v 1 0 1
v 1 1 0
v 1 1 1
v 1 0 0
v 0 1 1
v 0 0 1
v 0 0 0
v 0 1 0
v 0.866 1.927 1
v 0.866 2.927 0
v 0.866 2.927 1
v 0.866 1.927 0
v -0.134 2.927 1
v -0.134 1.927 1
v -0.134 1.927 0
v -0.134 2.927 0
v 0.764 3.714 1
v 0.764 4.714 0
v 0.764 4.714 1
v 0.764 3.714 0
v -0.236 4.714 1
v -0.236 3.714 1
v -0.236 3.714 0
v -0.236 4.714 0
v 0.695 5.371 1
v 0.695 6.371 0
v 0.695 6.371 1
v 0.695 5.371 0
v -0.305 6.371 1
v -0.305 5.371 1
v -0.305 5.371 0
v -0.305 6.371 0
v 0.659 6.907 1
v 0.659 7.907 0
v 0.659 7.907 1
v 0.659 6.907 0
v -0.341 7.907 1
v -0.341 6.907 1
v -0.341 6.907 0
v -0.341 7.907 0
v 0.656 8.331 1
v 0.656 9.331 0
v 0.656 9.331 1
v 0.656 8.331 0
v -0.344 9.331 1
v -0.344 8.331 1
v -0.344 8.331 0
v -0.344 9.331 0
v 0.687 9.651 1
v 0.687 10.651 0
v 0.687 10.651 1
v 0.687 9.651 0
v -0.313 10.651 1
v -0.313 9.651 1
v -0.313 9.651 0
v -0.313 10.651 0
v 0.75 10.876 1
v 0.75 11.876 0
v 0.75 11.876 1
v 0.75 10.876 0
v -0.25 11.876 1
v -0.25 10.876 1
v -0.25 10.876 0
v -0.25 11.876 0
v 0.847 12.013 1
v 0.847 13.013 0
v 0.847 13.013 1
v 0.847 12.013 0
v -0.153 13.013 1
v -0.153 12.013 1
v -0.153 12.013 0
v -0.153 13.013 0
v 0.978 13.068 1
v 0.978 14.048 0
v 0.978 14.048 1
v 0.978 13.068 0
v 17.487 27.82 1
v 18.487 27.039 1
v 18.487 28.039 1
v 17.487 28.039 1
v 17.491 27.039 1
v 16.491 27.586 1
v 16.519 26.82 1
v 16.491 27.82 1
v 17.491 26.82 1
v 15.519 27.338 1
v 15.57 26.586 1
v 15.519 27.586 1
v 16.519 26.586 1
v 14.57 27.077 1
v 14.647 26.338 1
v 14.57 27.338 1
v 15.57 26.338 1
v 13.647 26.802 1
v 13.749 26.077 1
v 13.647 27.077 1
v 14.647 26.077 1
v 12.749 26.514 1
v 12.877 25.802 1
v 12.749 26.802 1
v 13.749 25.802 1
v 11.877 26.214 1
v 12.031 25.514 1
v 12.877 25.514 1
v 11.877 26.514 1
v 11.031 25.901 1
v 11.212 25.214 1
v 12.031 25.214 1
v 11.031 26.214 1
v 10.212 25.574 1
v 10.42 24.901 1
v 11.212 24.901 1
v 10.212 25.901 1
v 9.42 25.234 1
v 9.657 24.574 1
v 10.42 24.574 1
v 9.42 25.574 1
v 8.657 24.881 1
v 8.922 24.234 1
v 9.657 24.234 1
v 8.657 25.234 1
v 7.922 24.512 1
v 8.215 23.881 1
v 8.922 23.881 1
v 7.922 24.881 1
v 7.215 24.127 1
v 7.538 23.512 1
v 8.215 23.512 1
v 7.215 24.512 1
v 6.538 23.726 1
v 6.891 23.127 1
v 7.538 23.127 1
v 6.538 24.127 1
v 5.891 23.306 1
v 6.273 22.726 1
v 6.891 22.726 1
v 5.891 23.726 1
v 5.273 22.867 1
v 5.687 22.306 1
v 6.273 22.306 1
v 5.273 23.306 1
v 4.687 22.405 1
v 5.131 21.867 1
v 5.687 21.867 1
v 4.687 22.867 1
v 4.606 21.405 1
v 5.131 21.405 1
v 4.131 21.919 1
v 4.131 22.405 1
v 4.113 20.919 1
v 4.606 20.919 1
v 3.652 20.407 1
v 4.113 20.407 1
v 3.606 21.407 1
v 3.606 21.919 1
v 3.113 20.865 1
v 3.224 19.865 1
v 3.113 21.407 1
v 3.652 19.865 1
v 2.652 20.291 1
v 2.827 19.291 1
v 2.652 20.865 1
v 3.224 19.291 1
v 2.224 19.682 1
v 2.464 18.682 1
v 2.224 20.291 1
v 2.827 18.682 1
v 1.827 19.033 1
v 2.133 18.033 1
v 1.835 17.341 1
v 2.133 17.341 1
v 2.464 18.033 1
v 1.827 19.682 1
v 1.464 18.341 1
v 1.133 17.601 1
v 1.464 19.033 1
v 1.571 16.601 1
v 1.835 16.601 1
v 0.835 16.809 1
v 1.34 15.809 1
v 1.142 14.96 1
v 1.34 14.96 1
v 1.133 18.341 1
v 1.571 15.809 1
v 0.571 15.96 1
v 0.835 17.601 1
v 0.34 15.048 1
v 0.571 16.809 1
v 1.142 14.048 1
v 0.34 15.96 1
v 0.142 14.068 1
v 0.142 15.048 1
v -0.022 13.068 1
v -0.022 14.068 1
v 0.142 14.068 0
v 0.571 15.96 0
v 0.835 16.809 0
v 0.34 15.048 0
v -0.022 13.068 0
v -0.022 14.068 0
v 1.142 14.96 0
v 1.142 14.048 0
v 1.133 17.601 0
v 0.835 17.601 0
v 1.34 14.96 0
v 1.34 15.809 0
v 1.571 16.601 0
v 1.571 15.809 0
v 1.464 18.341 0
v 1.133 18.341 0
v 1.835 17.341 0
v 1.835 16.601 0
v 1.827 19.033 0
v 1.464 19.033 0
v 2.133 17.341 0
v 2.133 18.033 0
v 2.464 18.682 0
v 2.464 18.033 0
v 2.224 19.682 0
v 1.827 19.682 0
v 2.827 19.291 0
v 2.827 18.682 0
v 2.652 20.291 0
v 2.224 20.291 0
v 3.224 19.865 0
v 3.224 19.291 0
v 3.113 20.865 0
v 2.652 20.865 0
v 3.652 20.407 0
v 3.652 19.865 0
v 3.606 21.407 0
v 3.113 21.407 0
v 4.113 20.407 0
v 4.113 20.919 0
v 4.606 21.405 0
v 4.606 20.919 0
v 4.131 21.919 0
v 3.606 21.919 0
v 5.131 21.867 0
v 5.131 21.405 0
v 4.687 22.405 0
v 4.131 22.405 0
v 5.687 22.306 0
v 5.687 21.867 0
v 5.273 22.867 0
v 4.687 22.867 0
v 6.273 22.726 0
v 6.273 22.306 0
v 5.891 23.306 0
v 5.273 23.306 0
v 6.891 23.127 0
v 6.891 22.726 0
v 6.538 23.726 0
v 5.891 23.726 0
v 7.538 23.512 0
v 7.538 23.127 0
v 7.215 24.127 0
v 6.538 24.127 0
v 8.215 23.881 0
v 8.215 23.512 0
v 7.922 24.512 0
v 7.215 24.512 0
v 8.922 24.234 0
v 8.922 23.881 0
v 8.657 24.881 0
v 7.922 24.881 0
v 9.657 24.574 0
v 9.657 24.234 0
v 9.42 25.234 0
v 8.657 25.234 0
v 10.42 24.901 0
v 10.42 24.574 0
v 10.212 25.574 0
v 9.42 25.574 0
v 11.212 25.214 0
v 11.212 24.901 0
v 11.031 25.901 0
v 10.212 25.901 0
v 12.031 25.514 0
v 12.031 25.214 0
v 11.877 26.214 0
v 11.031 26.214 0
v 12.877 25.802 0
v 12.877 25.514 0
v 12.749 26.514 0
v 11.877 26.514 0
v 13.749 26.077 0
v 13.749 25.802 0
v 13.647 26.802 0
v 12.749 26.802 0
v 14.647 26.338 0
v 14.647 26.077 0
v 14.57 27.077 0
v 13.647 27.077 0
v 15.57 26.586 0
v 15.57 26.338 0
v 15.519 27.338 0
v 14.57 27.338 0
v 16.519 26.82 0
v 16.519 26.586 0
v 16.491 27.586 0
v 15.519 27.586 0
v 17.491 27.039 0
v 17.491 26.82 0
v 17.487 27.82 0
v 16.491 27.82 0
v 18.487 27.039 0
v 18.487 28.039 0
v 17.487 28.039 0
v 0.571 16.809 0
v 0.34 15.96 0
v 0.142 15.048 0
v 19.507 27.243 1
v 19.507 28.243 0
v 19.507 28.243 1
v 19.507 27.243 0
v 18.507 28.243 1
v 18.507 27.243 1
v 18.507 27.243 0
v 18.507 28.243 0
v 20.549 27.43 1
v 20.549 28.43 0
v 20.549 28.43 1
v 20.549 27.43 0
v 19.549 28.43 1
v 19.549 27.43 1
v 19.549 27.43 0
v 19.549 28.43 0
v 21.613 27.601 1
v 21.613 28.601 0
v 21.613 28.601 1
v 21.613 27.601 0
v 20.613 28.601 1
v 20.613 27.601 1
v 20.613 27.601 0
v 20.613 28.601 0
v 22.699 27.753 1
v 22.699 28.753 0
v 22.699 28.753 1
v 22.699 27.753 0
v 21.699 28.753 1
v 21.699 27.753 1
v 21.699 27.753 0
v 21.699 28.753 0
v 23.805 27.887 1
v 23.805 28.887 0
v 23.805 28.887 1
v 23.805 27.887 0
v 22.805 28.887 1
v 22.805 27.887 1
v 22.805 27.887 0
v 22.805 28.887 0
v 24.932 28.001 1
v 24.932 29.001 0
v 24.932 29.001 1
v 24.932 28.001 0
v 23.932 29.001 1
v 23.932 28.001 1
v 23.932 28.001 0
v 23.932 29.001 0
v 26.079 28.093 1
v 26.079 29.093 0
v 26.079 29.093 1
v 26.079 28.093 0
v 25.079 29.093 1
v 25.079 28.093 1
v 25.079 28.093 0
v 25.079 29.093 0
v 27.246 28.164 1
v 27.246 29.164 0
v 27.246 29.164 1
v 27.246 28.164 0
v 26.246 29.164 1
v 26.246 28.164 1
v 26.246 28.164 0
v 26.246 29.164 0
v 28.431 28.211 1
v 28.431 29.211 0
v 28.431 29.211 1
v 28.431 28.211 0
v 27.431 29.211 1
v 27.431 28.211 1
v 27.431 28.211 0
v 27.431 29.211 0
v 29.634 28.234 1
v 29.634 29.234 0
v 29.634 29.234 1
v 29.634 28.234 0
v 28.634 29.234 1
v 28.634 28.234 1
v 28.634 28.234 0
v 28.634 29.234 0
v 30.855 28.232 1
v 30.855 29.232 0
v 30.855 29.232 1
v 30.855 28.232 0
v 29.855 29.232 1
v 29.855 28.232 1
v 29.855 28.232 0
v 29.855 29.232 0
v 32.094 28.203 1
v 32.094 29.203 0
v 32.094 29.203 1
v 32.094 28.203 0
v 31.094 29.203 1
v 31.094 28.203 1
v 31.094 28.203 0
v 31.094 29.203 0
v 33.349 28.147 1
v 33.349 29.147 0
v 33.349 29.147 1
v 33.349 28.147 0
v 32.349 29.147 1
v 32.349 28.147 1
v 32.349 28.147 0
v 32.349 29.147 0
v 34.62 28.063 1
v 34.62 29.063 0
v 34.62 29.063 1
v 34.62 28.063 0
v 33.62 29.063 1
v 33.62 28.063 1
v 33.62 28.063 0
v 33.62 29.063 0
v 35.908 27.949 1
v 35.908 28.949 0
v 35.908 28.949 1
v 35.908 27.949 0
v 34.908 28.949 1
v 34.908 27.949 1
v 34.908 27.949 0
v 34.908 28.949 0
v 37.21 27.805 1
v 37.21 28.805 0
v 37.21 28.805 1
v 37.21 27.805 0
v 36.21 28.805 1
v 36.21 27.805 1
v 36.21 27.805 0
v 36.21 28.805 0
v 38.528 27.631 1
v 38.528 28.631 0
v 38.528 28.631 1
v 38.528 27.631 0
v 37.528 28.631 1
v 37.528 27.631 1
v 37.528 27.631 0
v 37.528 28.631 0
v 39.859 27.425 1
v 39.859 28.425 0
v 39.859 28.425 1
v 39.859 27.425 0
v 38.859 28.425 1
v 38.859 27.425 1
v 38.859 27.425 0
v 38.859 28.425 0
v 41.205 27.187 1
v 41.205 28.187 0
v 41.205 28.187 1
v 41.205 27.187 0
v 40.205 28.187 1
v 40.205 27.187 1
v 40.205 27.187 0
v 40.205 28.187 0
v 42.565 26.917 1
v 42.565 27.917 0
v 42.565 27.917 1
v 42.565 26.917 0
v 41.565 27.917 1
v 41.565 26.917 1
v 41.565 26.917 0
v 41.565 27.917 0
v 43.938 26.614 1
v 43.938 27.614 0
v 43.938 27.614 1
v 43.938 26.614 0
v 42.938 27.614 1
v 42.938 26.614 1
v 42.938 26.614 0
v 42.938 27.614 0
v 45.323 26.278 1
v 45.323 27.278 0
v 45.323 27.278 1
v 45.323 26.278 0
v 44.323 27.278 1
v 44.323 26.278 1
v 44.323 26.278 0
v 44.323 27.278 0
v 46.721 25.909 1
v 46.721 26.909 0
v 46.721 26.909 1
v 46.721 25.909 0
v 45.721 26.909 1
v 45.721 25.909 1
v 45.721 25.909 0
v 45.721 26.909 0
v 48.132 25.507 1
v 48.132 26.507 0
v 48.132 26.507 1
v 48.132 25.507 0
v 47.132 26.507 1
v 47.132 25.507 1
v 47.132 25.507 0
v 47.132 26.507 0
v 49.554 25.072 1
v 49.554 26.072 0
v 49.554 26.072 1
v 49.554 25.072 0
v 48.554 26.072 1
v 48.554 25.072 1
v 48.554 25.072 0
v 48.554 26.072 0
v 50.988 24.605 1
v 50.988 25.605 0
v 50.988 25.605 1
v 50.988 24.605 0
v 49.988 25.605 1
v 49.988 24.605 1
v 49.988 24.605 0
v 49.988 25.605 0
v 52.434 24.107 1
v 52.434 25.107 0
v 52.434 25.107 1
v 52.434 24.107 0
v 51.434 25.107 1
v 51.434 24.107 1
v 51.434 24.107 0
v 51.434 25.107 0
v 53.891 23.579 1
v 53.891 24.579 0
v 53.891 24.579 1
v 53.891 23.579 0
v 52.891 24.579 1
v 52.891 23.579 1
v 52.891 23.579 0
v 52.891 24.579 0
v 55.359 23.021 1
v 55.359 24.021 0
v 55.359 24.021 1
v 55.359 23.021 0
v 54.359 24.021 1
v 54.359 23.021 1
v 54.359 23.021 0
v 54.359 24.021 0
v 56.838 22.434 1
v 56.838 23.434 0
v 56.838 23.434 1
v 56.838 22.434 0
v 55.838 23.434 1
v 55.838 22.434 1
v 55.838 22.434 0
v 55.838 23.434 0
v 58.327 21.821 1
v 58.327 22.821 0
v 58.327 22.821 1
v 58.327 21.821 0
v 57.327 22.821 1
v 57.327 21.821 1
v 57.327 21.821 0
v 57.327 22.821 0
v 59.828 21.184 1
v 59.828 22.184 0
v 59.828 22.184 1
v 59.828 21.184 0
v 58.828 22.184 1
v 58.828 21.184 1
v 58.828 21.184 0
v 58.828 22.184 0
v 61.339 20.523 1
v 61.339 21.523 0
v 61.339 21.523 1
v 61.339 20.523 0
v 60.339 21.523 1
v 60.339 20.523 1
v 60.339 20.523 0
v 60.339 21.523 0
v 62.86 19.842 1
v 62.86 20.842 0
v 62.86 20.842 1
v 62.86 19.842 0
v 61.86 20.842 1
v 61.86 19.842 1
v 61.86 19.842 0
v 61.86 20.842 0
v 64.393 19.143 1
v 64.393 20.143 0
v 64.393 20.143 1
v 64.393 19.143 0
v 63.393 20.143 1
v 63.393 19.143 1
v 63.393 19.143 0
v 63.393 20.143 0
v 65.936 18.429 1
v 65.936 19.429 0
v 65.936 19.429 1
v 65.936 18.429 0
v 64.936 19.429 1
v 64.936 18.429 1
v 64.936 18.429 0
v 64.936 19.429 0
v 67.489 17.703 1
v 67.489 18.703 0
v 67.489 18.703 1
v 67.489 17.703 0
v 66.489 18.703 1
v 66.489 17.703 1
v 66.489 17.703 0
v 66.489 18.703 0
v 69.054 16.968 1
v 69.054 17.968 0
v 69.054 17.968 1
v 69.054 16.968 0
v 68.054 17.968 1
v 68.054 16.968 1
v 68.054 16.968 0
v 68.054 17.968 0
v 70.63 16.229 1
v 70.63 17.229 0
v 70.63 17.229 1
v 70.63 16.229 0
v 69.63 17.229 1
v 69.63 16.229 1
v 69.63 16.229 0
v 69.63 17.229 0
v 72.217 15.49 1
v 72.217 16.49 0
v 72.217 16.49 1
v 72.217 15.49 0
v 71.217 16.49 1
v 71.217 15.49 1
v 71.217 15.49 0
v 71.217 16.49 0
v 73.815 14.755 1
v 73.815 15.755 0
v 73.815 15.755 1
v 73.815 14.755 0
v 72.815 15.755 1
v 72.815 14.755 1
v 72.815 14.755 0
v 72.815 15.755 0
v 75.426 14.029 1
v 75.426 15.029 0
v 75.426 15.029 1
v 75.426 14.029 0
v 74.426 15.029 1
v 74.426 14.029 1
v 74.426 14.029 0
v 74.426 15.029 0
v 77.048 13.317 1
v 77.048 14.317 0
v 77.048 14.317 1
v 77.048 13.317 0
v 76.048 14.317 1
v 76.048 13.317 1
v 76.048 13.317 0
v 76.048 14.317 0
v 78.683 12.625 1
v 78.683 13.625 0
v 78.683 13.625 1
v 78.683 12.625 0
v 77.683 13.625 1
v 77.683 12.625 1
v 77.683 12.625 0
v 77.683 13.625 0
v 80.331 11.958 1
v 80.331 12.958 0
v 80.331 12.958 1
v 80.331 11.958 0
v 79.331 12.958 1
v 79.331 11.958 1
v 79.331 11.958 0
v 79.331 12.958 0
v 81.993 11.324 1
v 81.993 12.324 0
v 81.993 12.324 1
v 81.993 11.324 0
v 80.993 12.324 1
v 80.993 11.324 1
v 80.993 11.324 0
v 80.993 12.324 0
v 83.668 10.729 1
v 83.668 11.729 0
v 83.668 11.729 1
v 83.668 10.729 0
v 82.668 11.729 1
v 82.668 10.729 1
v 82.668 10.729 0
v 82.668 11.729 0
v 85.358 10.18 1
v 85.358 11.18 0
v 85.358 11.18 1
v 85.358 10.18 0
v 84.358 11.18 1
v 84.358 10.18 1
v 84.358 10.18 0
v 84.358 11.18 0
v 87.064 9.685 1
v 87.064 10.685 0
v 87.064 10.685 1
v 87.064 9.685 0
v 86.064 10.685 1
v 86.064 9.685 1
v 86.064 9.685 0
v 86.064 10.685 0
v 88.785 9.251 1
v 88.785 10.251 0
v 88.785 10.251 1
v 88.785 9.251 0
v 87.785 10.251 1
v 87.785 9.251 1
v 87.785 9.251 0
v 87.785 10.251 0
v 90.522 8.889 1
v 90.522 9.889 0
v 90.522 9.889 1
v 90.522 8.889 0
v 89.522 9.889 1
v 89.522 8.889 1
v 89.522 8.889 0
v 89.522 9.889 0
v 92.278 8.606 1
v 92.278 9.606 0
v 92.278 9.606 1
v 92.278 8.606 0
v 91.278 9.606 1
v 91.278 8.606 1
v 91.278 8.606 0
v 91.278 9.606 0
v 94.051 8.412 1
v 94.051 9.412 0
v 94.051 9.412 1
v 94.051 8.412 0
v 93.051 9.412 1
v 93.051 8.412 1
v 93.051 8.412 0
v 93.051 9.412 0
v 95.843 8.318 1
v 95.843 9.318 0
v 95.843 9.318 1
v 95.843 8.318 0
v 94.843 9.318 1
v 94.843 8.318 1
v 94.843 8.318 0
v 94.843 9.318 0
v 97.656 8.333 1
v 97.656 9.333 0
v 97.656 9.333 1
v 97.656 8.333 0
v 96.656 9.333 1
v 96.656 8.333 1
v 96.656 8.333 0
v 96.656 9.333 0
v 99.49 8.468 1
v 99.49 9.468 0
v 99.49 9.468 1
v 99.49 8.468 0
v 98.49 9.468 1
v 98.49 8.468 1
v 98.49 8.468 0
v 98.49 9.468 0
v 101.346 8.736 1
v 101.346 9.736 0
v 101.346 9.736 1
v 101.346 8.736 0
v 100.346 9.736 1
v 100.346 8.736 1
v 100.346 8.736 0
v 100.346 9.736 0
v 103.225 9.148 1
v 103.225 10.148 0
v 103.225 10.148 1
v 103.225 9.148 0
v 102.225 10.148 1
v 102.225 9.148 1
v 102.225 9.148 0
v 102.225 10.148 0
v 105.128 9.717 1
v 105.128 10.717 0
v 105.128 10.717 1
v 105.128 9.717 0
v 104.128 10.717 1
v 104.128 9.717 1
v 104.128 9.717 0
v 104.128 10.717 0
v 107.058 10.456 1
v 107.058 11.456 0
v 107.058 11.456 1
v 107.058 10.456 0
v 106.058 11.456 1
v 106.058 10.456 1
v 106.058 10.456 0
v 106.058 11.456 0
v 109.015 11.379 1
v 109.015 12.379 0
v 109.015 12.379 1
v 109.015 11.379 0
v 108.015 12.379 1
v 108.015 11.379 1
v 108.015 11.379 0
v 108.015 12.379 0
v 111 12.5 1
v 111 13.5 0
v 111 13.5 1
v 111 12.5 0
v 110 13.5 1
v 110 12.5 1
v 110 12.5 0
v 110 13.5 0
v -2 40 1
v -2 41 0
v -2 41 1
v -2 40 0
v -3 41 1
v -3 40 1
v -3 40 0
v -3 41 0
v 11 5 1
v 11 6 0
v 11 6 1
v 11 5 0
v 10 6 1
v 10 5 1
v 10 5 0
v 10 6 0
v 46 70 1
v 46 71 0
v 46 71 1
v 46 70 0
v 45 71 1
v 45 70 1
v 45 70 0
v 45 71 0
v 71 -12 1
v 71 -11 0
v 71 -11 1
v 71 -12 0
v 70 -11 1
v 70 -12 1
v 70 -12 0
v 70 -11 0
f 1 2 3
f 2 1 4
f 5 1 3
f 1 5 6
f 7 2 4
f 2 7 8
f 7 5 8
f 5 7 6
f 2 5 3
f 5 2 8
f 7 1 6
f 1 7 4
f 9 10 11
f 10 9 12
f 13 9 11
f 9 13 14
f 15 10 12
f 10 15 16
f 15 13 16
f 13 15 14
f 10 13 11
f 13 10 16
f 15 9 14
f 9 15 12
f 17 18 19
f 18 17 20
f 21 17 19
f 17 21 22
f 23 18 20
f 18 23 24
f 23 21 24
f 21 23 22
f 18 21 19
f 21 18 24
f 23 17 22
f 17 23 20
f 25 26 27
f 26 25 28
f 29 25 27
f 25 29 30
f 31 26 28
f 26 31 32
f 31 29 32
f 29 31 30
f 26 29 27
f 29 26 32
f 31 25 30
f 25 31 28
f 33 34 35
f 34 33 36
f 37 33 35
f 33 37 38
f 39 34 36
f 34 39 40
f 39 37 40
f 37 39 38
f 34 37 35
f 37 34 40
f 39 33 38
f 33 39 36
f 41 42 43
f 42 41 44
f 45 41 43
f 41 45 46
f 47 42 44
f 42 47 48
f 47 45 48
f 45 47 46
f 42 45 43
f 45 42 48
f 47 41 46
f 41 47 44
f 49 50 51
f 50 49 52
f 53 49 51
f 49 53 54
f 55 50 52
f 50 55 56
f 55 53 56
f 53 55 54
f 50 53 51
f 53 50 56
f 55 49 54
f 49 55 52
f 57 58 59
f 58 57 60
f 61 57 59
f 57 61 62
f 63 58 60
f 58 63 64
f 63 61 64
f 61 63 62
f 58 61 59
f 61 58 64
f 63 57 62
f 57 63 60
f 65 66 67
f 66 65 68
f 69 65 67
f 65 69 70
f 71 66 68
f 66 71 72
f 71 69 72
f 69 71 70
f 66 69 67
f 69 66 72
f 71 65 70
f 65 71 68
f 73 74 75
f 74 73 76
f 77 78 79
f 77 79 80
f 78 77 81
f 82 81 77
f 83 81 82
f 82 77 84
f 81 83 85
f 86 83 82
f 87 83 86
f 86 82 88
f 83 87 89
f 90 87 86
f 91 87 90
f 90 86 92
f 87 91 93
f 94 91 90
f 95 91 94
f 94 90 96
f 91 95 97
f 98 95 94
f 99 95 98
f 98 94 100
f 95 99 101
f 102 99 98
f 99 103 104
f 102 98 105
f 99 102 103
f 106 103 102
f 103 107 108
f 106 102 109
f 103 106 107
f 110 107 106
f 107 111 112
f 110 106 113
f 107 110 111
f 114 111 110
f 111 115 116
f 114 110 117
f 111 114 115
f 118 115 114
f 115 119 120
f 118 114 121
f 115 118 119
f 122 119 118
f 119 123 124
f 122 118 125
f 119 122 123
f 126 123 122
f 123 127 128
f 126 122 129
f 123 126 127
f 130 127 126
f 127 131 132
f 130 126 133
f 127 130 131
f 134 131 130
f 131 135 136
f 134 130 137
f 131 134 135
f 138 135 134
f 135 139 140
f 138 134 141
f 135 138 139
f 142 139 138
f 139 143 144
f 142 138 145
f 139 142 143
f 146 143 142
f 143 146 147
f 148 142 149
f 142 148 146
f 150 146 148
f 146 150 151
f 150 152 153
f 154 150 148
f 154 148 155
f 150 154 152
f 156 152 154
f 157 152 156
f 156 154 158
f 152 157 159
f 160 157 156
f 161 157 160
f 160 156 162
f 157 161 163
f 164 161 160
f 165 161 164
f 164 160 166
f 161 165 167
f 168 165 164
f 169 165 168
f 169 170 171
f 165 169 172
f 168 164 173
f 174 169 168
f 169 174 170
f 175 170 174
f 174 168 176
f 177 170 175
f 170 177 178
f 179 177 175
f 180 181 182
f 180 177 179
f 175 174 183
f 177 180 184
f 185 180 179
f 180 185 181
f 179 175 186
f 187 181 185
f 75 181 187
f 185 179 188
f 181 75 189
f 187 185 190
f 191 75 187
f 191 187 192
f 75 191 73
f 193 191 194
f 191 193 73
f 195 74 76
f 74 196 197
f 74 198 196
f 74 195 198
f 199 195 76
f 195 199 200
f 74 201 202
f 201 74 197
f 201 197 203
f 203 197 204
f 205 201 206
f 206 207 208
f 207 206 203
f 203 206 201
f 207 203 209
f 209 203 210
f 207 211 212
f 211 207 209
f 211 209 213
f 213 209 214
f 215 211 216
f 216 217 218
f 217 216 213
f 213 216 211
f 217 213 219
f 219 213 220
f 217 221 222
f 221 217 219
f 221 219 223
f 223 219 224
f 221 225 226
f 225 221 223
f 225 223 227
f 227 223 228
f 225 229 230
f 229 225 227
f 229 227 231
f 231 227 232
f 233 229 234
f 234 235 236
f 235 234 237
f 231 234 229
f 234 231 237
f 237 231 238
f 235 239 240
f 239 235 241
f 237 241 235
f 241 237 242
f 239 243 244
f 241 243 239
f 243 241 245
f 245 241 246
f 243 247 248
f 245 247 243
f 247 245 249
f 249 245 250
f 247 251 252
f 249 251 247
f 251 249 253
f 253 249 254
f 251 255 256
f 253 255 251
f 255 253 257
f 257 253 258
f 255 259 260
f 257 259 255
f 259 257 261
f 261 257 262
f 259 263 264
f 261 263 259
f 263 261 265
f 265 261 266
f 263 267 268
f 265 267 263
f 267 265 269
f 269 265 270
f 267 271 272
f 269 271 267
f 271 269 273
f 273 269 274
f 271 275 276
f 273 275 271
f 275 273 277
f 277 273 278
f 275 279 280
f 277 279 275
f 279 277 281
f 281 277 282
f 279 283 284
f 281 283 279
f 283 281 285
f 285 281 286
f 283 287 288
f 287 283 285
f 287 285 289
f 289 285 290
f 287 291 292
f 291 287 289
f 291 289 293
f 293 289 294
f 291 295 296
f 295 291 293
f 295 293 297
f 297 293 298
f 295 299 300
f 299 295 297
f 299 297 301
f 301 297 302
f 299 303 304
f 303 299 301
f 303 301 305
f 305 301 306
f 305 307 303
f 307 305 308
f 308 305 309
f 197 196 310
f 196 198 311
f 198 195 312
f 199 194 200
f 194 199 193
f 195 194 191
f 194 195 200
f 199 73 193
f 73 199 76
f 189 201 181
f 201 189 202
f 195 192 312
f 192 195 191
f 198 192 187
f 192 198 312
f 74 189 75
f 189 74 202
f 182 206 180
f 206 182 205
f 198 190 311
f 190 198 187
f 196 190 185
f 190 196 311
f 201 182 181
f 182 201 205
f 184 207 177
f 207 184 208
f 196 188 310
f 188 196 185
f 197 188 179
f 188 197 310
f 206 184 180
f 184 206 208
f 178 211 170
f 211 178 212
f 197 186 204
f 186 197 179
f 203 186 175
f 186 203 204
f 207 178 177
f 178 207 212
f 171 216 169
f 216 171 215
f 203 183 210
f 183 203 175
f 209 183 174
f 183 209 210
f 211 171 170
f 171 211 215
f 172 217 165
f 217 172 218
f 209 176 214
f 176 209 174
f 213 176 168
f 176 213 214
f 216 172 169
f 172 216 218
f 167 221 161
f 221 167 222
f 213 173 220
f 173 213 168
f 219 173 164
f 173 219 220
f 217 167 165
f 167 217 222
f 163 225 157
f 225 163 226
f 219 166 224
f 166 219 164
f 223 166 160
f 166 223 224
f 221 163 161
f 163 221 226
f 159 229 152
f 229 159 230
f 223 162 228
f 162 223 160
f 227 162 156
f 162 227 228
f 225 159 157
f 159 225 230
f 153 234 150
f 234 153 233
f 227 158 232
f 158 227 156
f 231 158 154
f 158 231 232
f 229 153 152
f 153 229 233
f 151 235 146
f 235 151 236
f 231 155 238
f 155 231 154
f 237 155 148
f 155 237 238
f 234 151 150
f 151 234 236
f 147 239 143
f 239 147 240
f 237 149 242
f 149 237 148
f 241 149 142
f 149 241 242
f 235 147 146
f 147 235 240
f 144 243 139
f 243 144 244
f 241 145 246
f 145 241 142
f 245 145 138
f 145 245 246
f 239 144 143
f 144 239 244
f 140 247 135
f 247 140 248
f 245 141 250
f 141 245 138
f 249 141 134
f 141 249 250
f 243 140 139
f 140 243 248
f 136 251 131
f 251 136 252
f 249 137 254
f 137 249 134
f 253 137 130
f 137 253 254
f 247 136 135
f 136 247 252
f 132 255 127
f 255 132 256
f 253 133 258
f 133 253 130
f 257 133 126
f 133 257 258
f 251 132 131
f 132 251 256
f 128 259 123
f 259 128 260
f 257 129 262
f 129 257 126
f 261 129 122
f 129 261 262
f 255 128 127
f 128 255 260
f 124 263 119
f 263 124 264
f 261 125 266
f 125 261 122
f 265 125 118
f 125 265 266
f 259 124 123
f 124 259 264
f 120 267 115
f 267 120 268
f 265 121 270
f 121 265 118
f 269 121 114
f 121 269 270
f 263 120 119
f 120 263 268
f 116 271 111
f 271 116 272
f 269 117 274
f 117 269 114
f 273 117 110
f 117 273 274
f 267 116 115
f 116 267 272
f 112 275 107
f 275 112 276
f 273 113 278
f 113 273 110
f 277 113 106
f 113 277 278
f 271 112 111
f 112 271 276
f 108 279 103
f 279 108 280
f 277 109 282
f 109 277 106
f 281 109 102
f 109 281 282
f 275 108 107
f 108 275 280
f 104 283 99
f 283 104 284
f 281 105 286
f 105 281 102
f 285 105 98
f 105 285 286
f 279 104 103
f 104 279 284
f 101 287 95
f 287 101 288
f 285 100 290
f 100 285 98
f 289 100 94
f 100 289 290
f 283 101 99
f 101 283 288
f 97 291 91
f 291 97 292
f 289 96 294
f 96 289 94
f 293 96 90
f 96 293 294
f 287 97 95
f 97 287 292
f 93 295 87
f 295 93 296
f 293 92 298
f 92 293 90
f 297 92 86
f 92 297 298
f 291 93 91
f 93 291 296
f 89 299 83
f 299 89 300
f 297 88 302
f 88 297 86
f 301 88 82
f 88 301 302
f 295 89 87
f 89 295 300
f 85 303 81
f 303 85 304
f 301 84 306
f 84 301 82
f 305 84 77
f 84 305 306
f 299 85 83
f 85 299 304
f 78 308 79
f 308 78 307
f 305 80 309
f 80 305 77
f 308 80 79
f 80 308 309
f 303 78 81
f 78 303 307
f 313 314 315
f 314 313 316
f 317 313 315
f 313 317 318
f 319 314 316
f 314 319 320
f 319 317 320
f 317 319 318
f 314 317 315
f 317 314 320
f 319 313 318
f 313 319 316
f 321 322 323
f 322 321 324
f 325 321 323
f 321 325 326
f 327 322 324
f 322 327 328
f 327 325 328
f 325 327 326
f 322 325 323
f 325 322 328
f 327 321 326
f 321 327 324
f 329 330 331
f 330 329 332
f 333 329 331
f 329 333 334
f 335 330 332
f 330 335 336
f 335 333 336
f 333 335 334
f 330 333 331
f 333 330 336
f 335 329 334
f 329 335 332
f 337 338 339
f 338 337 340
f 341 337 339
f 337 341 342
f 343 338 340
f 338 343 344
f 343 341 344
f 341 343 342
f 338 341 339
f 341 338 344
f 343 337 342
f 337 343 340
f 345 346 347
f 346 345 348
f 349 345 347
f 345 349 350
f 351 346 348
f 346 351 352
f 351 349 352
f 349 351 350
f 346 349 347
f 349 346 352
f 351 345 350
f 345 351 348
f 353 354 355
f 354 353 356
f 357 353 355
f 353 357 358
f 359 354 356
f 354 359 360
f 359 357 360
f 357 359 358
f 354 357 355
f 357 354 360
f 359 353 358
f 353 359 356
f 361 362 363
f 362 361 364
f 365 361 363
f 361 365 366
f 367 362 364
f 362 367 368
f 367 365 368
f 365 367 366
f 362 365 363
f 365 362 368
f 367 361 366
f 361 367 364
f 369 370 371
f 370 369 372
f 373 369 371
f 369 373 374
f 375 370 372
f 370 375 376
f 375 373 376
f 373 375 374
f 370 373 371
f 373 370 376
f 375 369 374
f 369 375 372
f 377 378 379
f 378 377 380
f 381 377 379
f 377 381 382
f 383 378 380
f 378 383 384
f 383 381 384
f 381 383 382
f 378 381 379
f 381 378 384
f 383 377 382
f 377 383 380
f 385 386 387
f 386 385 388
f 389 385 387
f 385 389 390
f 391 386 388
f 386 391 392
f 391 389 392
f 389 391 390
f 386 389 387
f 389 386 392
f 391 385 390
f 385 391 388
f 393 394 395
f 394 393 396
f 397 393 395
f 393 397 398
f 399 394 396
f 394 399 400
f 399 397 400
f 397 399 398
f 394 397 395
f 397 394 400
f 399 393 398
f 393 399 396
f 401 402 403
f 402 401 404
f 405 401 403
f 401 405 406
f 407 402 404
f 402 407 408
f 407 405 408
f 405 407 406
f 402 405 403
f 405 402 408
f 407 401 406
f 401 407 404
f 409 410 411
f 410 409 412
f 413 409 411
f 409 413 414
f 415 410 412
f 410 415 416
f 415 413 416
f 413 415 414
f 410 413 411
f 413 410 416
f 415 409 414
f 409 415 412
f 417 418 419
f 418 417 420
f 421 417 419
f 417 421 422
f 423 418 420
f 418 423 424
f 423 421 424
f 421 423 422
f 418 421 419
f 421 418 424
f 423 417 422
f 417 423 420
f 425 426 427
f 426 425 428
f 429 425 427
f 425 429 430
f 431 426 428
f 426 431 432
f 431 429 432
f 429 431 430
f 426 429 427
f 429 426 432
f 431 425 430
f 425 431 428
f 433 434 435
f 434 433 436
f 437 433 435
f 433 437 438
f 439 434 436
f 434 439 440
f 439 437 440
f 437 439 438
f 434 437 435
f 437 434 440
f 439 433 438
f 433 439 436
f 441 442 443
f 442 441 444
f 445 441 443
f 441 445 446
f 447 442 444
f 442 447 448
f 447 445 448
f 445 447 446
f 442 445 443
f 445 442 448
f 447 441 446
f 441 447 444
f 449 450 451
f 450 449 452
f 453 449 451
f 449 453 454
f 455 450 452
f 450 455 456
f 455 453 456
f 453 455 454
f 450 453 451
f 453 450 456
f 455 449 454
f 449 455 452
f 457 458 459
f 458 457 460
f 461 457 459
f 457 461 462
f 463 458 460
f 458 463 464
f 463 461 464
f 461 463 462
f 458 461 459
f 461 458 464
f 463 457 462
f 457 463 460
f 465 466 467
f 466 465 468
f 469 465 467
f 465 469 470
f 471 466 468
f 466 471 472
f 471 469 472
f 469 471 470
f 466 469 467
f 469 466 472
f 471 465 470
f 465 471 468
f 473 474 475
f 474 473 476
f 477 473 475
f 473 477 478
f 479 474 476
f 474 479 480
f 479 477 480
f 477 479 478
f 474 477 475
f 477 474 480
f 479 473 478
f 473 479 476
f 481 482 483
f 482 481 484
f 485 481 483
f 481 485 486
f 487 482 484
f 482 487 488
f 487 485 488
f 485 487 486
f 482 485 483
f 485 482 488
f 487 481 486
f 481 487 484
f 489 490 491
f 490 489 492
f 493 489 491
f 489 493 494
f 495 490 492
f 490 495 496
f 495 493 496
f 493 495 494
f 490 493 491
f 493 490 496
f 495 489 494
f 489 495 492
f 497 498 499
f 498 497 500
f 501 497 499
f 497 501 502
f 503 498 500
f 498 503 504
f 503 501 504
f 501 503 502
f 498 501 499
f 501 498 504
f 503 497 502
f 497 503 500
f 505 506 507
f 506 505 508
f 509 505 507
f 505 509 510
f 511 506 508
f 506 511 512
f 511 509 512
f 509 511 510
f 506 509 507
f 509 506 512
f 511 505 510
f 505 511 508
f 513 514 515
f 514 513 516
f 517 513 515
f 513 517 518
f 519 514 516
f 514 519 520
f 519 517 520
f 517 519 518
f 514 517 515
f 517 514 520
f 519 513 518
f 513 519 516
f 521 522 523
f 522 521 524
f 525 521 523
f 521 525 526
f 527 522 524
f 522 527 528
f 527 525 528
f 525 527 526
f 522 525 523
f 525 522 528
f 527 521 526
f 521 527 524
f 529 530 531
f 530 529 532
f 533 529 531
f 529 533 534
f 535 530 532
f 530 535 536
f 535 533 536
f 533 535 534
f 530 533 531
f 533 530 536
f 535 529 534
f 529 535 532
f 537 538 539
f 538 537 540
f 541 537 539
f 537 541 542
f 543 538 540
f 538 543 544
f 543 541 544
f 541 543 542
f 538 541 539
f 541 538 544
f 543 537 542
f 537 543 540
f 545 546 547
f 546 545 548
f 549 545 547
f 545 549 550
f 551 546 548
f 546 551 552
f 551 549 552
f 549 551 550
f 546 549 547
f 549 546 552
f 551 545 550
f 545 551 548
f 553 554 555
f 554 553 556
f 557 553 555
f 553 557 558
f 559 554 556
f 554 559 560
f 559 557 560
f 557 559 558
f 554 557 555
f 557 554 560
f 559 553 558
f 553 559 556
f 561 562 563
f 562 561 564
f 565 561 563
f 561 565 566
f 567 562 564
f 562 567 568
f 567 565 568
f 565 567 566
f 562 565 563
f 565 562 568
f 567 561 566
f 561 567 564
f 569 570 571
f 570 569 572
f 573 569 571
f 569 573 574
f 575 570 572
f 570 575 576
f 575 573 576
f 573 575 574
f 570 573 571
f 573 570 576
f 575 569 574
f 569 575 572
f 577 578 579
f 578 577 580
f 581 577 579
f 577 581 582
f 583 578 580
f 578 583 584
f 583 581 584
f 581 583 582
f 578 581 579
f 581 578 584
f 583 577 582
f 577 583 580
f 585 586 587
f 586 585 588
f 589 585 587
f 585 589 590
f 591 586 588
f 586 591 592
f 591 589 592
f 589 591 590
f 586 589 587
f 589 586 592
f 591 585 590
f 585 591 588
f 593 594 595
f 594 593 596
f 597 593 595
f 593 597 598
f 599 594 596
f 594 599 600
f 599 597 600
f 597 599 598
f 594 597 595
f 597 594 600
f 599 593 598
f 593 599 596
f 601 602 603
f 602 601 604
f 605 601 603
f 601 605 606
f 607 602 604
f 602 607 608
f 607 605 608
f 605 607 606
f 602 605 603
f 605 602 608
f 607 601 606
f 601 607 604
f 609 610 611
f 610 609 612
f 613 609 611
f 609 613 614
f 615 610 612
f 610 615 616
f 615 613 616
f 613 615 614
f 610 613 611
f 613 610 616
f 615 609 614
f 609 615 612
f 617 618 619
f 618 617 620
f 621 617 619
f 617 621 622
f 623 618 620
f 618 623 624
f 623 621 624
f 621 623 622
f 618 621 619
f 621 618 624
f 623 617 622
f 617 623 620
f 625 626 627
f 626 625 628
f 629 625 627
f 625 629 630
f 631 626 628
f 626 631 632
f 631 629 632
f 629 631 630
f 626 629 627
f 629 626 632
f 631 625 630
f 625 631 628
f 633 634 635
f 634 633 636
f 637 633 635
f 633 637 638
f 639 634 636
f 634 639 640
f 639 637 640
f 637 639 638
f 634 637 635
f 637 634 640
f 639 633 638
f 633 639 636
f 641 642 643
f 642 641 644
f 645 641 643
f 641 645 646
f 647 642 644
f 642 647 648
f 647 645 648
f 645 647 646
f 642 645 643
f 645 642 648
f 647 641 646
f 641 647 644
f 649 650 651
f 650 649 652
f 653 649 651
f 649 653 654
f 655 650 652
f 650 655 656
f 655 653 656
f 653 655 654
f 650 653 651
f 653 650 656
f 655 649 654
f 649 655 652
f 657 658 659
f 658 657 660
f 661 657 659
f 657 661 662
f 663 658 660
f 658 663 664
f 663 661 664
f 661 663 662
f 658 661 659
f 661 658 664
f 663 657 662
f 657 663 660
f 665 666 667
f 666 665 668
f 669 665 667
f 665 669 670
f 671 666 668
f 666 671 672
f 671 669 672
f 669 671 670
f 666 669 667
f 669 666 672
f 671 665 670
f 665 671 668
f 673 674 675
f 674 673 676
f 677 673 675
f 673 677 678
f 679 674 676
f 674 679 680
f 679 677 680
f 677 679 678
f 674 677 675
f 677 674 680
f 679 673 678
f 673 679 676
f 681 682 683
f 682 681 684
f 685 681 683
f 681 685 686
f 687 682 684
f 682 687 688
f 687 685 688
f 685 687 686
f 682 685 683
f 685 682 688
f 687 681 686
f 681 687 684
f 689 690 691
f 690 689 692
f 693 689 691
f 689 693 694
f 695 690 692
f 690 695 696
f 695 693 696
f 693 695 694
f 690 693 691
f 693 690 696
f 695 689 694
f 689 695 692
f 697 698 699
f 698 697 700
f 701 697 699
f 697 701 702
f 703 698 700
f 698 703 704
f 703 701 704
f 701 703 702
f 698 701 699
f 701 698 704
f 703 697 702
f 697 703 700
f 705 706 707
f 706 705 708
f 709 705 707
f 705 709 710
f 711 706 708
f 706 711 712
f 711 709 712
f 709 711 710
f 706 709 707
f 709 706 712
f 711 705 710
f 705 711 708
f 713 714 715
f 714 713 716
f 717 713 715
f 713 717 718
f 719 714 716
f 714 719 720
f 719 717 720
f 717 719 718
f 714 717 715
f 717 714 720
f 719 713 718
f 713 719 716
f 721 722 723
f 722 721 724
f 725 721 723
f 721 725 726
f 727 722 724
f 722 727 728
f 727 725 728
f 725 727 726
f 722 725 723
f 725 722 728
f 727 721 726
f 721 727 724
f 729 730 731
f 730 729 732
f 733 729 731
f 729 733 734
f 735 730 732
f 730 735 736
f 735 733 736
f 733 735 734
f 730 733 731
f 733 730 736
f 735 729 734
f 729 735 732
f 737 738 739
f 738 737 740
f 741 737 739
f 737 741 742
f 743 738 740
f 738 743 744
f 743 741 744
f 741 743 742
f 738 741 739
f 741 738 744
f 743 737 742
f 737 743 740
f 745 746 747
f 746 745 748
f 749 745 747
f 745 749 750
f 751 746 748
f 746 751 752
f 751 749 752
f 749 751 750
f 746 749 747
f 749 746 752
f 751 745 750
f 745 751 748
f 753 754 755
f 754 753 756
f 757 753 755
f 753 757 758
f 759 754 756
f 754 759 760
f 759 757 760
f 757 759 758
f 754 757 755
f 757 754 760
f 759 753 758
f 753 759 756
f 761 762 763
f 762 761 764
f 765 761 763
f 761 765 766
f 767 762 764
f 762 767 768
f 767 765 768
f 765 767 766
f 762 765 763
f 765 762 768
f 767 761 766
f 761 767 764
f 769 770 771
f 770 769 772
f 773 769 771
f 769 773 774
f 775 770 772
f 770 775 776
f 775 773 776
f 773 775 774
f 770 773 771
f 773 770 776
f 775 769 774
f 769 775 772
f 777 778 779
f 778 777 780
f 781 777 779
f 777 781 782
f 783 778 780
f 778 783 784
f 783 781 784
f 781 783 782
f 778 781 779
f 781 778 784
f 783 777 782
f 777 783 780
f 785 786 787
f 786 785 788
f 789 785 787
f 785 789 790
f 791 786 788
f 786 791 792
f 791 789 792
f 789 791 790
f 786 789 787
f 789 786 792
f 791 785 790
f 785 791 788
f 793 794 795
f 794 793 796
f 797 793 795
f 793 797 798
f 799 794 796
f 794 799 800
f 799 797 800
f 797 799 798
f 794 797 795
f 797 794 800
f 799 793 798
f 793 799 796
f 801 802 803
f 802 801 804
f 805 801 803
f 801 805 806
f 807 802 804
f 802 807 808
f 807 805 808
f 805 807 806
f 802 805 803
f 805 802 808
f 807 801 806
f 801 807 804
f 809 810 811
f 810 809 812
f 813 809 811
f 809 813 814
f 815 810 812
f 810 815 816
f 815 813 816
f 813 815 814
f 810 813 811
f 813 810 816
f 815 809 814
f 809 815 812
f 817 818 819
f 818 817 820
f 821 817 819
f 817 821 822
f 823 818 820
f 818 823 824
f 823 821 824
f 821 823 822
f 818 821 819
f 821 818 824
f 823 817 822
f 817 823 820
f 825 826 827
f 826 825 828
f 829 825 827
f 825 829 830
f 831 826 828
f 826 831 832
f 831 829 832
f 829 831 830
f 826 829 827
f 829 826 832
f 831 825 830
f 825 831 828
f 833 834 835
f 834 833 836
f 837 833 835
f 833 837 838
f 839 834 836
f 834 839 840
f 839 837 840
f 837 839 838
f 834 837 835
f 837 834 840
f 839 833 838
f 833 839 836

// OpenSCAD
// file: Basolur.scad
// Bezier curve
function factorial(n) = n > 1 ? n*factorial(n-1) : 1;
function binomialCoef(m, n) = factorial(m) / (factorial(n)*factorial(m-n));
function bernsteinPol(m, n, u) = binomialCoef(m, n)*pow(u,n)*pow(1-u,m-n);
function termeBezier(controlPoints, step, t) = bernsteinPol(len(controlPoints)-1, step, t) * controlPoints[step];
function _bezierPoint(controlPoints, step, t) = step > 0 ? termeBezier(controlPoints, step, t) + _bezierPoint(controlPoints, step-1, t) : termeBezier(controlPoints, step, t) ;
function bezierPoint(controlPoints, t) = _bezierPoint(controlPoints, len(controlPoints)-1, t);
function bezierCurve(controlPoints, res) = [for(i=[0:res:1])bezierPoint(controlPoints, i)];

// Reuleaux polygone
function rayon(diameter, baseAngle) = diameter / (2*sin((360-baseAngle)/4));
function dot(baseAngle, nb, diameter) = rayon(diameter, baseAngle) * [-sin(baseAngle*nb),cos(baseAngle*nb)];
module reuleaux(side=3, diameter=10){
		dots = [for(i=[0:side-1])dot(360/side, i, diameter)];
		intersection_for(i=dots)
			translate(i)circle(r=diameter);
}

// Utils
function _t(a, i, c)= i==c ? a : 0;
function subOnList(pointList, index, amount) = [for(i=pointList)[i[0]-_t(amount, 0, index),i[1]-_t(amount, 1, index)]];

module reuleauxBezierShapeElement(side,point, thick, tol=0){
    translate([0, 0, point[0]-tol/2]) linear_extrude(thick+tol) reuleaux(side, diameter=2*point[1]);
}

module reuleauxBezierShape(side, bezierCurve, thick, tol=0){
    for(i=[0:len(bezierCurve)-2]){
        union(){
            hull(){
                reuleauxBezierShapeElement(side, bezierCurve[i], thick, tol);
                reuleauxBezierShapeElement(side, bezierCurve[i+1], thick, tol);
            }
        }
    };
}
// main file
include <Basolur.scad>
$fn=100;
nozzle=0.4;
height=110;
nbWall=6;

controlPoints = [
[0,0],
[-3, 40],
[10,5],
[45, 70],
[70, -12],
[height, 12.5]
];


thick=0.2;
tol=0.01;
keyTol=0.3;
bottomCut=17;
topCut=15;
res=0.01;
side=5;

bezierCurve=true;

if(bezierCurve){
    for(i=bezierCurve(controlPoints, 0.01)){
        translate(i) cube(1);
    }

    translate([0,30]) square([300,1]);
    translate([0,20]) square([300,1]);
    translate([40,0]) square([1, 300]);


    for(i=controlPoints){
        translate(i) color("red") cube(1);
    }
} else{
    difference(){
        reuleauxBezierShape(side, bezierCurve(controlPoints, res), thick);

        difference(){
            reuleauxBezierShape(side, subOnList(bezierCurve(controlPoints, res), 1, nozzle*nbWall), 0.01, thick);
            translate([0,0, height]) cube([100, 100, topCut*2], center=true );
            cube([100, 100, bottomCut*2], center=true );
        }

        translate([0,0,-1.99]) cube([100, 100, 4], center=true); // Base cut

    }
}
